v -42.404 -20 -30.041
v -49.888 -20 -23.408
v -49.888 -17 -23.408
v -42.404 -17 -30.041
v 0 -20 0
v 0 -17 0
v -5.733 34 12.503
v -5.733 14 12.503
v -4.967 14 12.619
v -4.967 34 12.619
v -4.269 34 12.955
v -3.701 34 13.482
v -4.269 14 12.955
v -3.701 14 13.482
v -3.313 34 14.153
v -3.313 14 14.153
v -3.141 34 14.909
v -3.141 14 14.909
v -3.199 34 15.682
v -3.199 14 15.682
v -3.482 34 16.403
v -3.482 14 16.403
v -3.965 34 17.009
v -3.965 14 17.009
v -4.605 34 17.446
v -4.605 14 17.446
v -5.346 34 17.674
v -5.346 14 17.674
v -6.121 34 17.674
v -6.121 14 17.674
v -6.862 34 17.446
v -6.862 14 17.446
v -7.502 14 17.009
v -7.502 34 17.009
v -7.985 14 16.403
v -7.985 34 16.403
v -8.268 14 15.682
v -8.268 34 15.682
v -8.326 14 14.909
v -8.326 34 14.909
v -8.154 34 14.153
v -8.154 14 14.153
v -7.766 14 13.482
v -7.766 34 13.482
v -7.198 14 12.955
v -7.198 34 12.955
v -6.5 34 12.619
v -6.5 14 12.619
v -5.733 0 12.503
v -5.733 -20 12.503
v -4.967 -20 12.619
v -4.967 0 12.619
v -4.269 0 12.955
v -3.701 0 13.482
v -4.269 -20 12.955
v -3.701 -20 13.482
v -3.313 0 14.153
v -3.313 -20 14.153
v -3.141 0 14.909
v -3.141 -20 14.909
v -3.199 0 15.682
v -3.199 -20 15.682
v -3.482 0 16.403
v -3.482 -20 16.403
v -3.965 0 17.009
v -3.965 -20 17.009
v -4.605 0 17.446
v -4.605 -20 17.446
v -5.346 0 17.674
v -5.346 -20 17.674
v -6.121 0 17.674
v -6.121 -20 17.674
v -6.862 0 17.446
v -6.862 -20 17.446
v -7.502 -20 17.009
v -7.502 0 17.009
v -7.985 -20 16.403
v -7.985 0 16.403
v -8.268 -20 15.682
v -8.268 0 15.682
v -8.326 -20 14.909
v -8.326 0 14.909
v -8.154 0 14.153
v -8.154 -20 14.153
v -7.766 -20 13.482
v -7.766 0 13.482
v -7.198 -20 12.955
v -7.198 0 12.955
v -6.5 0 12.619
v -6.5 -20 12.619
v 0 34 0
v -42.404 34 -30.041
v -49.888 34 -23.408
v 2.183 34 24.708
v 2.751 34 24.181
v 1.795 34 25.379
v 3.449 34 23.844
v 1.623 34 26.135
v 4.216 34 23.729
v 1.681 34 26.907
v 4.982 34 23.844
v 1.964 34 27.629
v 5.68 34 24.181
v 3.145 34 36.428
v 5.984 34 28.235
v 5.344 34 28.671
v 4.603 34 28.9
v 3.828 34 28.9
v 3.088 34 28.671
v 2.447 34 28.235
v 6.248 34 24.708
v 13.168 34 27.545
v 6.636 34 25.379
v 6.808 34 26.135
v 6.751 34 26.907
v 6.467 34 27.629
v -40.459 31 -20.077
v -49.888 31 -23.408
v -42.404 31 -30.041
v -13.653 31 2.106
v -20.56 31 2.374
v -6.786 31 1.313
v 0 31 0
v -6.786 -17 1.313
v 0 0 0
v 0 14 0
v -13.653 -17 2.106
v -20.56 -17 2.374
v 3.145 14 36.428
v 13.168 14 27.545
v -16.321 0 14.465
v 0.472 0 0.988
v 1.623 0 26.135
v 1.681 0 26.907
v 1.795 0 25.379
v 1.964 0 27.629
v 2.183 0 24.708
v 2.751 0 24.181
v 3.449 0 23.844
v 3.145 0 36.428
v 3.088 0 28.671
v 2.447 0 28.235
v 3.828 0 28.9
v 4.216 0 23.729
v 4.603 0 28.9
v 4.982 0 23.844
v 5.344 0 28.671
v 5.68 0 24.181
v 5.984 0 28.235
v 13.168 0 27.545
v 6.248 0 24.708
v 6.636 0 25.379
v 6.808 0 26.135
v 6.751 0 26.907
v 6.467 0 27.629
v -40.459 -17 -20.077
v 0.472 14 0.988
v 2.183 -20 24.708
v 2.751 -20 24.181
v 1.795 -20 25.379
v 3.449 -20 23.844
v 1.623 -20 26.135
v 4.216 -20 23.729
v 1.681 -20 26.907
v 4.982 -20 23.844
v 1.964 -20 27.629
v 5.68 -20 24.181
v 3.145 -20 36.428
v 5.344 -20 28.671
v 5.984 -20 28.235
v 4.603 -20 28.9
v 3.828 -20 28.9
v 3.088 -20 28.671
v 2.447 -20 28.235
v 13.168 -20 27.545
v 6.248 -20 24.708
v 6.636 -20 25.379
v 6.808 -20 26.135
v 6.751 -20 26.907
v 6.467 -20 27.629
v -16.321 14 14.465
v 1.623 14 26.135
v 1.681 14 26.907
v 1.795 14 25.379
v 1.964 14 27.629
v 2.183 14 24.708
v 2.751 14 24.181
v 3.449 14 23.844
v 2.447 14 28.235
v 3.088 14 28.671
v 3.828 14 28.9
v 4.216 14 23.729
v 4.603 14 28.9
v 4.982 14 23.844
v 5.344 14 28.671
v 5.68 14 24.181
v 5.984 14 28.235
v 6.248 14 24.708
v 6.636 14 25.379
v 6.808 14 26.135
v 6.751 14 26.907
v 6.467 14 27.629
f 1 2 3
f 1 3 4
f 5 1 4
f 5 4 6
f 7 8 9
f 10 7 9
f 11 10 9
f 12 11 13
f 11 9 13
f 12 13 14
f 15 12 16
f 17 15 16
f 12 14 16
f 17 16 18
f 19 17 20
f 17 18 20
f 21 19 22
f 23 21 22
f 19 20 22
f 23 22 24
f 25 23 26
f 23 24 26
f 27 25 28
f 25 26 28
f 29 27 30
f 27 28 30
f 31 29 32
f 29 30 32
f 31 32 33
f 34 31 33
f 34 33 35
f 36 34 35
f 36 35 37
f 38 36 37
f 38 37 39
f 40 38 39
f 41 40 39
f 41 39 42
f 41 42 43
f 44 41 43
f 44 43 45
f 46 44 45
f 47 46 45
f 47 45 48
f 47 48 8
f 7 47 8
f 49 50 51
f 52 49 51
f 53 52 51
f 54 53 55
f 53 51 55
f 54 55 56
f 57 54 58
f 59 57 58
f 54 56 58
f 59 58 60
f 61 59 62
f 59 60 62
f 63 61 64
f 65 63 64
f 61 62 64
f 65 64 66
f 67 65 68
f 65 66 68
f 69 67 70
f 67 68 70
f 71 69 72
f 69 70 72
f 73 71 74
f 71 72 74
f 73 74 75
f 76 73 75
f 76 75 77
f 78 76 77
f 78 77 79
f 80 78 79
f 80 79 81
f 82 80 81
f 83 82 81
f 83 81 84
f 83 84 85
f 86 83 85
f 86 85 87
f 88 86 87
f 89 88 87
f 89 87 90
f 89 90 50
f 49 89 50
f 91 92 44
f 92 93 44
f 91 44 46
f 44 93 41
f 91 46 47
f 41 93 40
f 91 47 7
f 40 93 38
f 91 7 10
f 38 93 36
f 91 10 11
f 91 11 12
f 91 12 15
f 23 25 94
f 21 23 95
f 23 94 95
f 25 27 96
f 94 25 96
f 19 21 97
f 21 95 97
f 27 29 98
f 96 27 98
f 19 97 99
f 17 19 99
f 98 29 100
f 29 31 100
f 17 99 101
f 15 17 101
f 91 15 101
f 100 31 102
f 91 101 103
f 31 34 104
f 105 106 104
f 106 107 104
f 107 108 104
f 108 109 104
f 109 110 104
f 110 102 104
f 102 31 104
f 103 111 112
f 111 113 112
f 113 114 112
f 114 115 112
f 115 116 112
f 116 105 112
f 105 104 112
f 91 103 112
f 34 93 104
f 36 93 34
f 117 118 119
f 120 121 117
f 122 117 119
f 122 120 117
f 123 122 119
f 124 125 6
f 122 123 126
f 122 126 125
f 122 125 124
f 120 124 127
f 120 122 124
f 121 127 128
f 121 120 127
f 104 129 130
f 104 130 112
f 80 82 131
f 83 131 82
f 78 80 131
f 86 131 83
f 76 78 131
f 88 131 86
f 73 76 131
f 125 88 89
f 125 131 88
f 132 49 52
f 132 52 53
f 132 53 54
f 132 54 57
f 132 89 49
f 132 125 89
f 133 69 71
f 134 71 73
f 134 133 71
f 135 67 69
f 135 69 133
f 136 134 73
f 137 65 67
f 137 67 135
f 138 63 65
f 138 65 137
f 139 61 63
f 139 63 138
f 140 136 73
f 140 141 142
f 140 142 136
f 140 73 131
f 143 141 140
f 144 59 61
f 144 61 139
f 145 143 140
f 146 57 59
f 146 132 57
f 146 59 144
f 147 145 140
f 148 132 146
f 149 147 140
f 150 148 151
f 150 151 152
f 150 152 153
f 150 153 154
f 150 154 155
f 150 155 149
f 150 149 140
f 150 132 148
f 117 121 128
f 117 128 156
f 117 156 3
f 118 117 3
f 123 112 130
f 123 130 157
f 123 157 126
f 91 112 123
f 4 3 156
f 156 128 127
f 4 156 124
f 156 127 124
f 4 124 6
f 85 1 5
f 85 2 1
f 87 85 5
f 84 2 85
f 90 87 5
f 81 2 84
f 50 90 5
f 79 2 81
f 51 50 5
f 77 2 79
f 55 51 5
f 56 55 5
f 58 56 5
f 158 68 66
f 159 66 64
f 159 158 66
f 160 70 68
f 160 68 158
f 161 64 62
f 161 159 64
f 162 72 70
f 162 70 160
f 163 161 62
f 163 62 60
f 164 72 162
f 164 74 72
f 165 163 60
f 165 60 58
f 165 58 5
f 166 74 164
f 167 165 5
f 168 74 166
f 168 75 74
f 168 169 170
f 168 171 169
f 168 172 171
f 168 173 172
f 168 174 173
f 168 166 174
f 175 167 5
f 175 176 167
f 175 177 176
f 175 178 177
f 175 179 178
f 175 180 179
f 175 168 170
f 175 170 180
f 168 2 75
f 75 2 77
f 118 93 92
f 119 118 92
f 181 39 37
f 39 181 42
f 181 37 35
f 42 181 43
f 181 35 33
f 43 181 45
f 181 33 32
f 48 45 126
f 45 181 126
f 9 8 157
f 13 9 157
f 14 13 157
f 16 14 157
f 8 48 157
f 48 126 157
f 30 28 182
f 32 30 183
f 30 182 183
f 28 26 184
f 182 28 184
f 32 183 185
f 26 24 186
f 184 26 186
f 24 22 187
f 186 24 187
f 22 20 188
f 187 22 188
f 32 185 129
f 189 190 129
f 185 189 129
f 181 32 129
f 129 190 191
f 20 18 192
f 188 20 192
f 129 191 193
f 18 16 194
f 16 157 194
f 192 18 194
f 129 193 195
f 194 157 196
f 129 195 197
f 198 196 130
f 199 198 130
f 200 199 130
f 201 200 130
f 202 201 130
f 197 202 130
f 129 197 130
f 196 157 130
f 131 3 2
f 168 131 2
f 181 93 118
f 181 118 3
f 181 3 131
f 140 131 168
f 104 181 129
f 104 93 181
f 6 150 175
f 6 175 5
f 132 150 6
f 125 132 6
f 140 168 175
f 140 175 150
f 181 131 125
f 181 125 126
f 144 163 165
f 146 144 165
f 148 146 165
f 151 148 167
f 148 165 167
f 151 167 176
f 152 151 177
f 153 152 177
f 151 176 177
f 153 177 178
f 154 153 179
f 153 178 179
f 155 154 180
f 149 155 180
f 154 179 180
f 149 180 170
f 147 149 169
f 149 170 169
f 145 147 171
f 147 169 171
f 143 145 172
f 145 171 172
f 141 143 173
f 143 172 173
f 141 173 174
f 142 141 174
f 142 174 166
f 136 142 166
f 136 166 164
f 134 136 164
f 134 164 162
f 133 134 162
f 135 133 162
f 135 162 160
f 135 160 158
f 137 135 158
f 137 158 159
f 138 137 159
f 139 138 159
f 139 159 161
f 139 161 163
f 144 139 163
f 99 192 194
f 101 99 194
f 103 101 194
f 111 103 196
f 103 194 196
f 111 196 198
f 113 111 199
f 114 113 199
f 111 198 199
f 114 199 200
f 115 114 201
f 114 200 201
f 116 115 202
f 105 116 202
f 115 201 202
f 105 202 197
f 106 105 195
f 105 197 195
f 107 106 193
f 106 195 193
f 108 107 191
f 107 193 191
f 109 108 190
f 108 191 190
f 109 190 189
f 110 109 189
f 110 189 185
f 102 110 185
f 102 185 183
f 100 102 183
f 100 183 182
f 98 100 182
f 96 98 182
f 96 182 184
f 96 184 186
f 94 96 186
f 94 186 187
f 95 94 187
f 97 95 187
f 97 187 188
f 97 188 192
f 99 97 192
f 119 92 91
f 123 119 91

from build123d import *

# Parameters (mm, degrees)
BOSS_EXTRUDE1_DEPTH      = 14
SKETCH3_R                = 4.125
CUT_EXTRUDE1_DEPTH       = 6
SKETCH5_R                = 1.125
CUT_EXTRUDE2_DEPTH       = 15
FILLET1_R                = 1
BOSS_EXTRUDE3_DEPTH      = 20
BOSS_EXTRUDE3_DEPTH_BACK = 34
SKETCH7_W                = 46.707438453
SKETCH7_H                = 20
CUT_EXTRUDE3_DEPTH       = 30
BOSS_EXTRUDE4_DEPTH      = 3
BOSS_EXTRUDE5_START      = -54
BOSS_EXTRUDE5_DEPTH      = 3
CUT_EXTRUDE5_REACH       = 111.564
SKETCH15_W               = 26.880557743
SKETCH15_H               = 40.856784115
CUT_EXTRUDE6_REACH       = 113.249
SKETCH16_R               = 1.6
CUT_EXTRUDE7_DEPTH       = 108.082055537
CUT_EXTRUDE7_DEPTH_BACK  = 108.082055537
SKETCH19_W               = 109.652108874
SKETCH19_H               = 14
SKETCH21_W               = 96.727229551
SKETCH21_H               = 14
CUT_EXTRUDE8_DEPTH       = 79.38857666
SKETCH22_R               = 2.6
CUT_EXTRUDE9_DEPTH       = 83.047416404


with BuildPart() as part:
    # Sketch1 → Boss-Extrude1 (new body)
    with BuildSketch(Plane(origin=(0, 0, 0), x_dir=(1, 0, 0), z_dir=(0, 1, 0))):
        with BuildLine():
            Line((47.5, -78.442713945), (47.5, -38.442713945))
            ThreePointArc((47.5, -38.442713945), (23.122023742, 0), (47.5, 38.442713945))
            Line((47.5, 38.442713945), (47.5, 50))
            Line((47.5, 50), (42.5, 50))
            Line((42.5, 50), (0, 0))
            Line((0, 0), (35.1, -73.422380253))
            Line((35.1, -73.422380253), (35.1, -93.442713945))
            Line((35.1, -93.442713945), (37.5, -93.442713945))
            Line((37.5, -93.442713945), (47.5, -93.442713945))
            Line((47.5, -93.442713945), (47.5, -78.442713945))
        make_face()
    extrude(amount=BOSS_EXTRUDE1_DEPTH)

    # Sketch3 → Cut-Extrude1 (cut)
    with BuildSketch(Plane.XZ):
        with BuildLine():
            Line((33.254958794, 84.403112572), (36.18509612, 92.428977457))
            Line((36.18509612, 92.428977457), (44.88509612, 92.428977457))
            Line((44.88509612, 92.428977457), (46.13509612, 88.028977457))
            Line((46.13509612, 88.028977457), (46.13509612, 70.028977457))
            Line((46.13509612, 70.028977457), (44.820911197, 53.062159312))
            ThreePointArc((44.820911197, 53.062159312), (40.059955227, 48.679043991), (35.34566343, 53.112310791))
            Line((35.34566343, 53.112310791), (33.254958794, 84.403112572))
        make_face()
        with Locations(Location((40.08509612, 83.428977457, 0), (0, 0, 90))):
            Circle(SKETCH3_R, mode=Mode.SUBTRACT)
    extrude(amount=-CUT_EXTRUDE1_DEPTH, mode=Mode.SUBTRACT)

    # Sketch5 → Cut-Extrude2 (cut)
    with BuildSketch(Plane.XZ.offset(-6)):
        with Locations(Location((40.08509612, 63.428977457, 0), (0, 0, 270))):
            Circle(SKETCH5_R)
        with Locations(Location((40.08509612, 58.928977457, 0), (0, 0, 270))):
            Circle(SKETCH5_R)
        with Locations(Location((40.08509612, 53.428977457, 0), (0, 0, 270))):
            Circle(SKETCH5_R)
    extrude(amount=-CUT_EXTRUDE2_DEPTH, mode=Mode.SUBTRACT)

    # Fillet1
    fillet1_edges = [part.edges().sort_by_distance(p)[0] for p in [
        (21.25, 0, -25),
        (45, 0, -50),
        (47.5, 0, -44.221356973),
        (23.122023742, 14, 0),
        (23.122023742, 0, 0),
        (47.5, 0, 65.942713945),
        (47.5, 14, -44.221356973),
        (42.5, 7, -50),
        (47.5, 7, -50),
        (47.5, 7, -38.442713945),
        (47.5, 7, 38.442713945),
        (45, 14, -50),
        (21.25, 14, -25),
        (47.5, 14, 65.942713945),
    ]]
    fillet(fillet1_edges, radius=FILLET1_R)

    # Sketch6 → Boss-Extrude3 (add, two sides: drawn at the far end of the back side and taken through both)
    with BuildSketch(Plane.XZ.offset(-BOSS_EXTRUDE3_DEPTH_BACK)):
        with BuildLine():
            Line((-40.458581161, -20.077158004), (-49.887563088, -23.407968691))
            Line((-49.887563088, -23.407968691), (34.124921356, 71.382705183))
            Line((34.124921356, 71.382705183), (0, 0))
            ThreePointArc((0, 0), (-10.212270894, 1.77453397), (-20.560220827, 2.374016932))
            Line((-20.560220827, 2.374016932), (-40.458581161, -20.077158004))
        make_face()
    extrude(amount=BOSS_EXTRUDE3_DEPTH + BOSS_EXTRUDE3_DEPTH_BACK)

    # Sketch7 → Cut-Extrude3 (cut)
    with BuildSketch(Plane(origin=(-16.32086192, 0, 14.465095586), x_dir=(0.6632786778078259, 0, 0.7483724978682089), z_dir=(-0.7483724978682089, 0, 0.6632786778078259))):
        with Locations((52.701466874, 24)):
            Rectangle(SKETCH7_W, SKETCH7_H)
        with Locations((52.701466874, -10)):
            Rectangle(SKETCH7_W, SKETCH7_H)
    extrude(amount=-CUT_EXTRUDE3_DEPTH, mode=Mode.SUBTRACT)

    # Sketch10 → Boss-Extrude4 (add)
    with BuildSketch(Plane.XZ.offset(20)):
        Polygon((-49.887563088, -23.407968691), (-42.403838109, -30.040755469), (0, 0), (-16.723629197, 14.010656202), align=None)
    extrude(amount=-BOSS_EXTRUDE4_DEPTH)

    # Sketch10<2> → Boss-Extrude5 (add)
    with BuildSketch(Plane.XZ.offset(20).offset(BOSS_EXTRUDE5_START)):
        Polygon((-49.887563088, -23.407968691), (-42.403838109, -30.040755469), (0, 0), (-16.723629197, 14.010656202), align=None)
    extrude(amount=BOSS_EXTRUDE5_DEPTH)

    # Cut-Extrude5: up to this face of the body (flat: up to its plane)
    cut_extrude5_end = Plane(part.part.faces().sort_by_distance((40.08509612, 0, 83.428977457))[0])
    # Sketch15 → Cut-Extrude5 (cut, up to the picked face)
    with BuildSketch(Plane(origin=(0, 6, 0), x_dir=(-1, 0, 0), z_dir=(0, -1, 0)), mode=Mode.PRIVATE) as cut_extrude5_sk1:
        with Locations((-44.420319758, -91.811097241)):
            Rectangle(SKETCH15_W, SKETCH15_H)
    cut_extrude5_tool1 = split(extrude(cut_extrude5_sk1.sketch, amount=CUT_EXTRUDE5_REACH, mode=Mode.PRIVATE), bisect_by=cut_extrude5_end, keep=Keep.BOTH, mode=Mode.PRIVATE)
    add(cut_extrude5_tool1.solids().sort_by(Axis((44.42032, 6, 91.811097), (0, -1, 0)))[0], mode=Mode.SUBTRACT)

    # Sketch16 → Cut-Extrude6 (cut, up to next)
    with BuildSketch(Plane(origin=(0, 14, 0), x_dir=(1, 0, 0), z_dir=(0, 1, 0)), mode=Mode.PRIVATE) as cut_extrude6_sk1:
        with Locations(Location((40.08509612, -83.428977457, 0), (0, 0, 270))):
            Circle(SKETCH16_R)
    cut_extrude6_tool1 = extrude(cut_extrude6_sk1.sketch, amount=-CUT_EXTRUDE6_REACH, mode=Mode.PRIVATE) & part.part
    add(cut_extrude6_tool1.solids().sort_by_distance((40.085096, 14, 83.428977))[0], mode=Mode.SUBTRACT)

    # Sketch19 → Cut-Extrude7 (cut, two sides: drawn at the far end of the back side and taken through both)
    with BuildSketch(Plane(origin=(-16.32086192, 0, 14.465095586), x_dir=(0.6632786778078262, 0, 0.7483724978682087), z_dir=(-0.7483724978682087, 0, 0.6632786778078262)).offset(-CUT_EXTRUDE7_DEPTH_BACK)):
        with Locations((54.826054437, 7)):
            Rectangle(SKETCH19_W, SKETCH19_H)
    extrude(amount=CUT_EXTRUDE7_DEPTH + CUT_EXTRUDE7_DEPTH_BACK, mode=Mode.SUBTRACT)


with BuildPart() as cut_extrude7_piece_1:
    # of the separate pieces the step leaves, piece 1, a body of its own (cut_extrude7_pieces)
    add(part.part.solids().sort_by_distance((3.144873335, 0, 36.428142799))[0])

    # Sketch22 → Cut-Extrude9 (cut, through all)
    with BuildSketch(Plane(origin=(0, -20, 0), x_dir=(-1, 0, 0), z_dir=(0, -1, 0))):
        with Locations(Location((5.733478103, -15.103299236, 0), (0, 0, 90))):
            Circle(SKETCH22_R)
        with Locations(Location((-4.215702064, -26.328886704, 0), (0, 0, 90))):
            Circle(SKETCH22_R)
    extrude(amount=-CUT_EXTRUDE9_DEPTH, mode=Mode.SUBTRACT)


with BuildPart() as cut_extrude7_piece_2:
    # of the separate pieces the step leaves, piece 2, a body of its own (cut_extrude7_pieces)
    add(part.part.solids().sort_by_distance((46.5, 0, -41.212709721))[0])

    # Sketch21 → Cut-Extrude8 (cut, through all)
    with BuildSketch(Plane(origin=(0, 0, 0), x_dir=(-0.4313049702307203, 0, -0.902206197415135), z_dir=(0.902206197415135, 0, -0.4313049702307203))):
        with Locations((24.708571423, 7)):
            Rectangle(SKETCH21_W, SKETCH21_H)
    extrude(amount=CUT_EXTRUDE8_DEPTH, mode=Mode.SUBTRACT)


solid = cut_extrude7_piece_1.part
